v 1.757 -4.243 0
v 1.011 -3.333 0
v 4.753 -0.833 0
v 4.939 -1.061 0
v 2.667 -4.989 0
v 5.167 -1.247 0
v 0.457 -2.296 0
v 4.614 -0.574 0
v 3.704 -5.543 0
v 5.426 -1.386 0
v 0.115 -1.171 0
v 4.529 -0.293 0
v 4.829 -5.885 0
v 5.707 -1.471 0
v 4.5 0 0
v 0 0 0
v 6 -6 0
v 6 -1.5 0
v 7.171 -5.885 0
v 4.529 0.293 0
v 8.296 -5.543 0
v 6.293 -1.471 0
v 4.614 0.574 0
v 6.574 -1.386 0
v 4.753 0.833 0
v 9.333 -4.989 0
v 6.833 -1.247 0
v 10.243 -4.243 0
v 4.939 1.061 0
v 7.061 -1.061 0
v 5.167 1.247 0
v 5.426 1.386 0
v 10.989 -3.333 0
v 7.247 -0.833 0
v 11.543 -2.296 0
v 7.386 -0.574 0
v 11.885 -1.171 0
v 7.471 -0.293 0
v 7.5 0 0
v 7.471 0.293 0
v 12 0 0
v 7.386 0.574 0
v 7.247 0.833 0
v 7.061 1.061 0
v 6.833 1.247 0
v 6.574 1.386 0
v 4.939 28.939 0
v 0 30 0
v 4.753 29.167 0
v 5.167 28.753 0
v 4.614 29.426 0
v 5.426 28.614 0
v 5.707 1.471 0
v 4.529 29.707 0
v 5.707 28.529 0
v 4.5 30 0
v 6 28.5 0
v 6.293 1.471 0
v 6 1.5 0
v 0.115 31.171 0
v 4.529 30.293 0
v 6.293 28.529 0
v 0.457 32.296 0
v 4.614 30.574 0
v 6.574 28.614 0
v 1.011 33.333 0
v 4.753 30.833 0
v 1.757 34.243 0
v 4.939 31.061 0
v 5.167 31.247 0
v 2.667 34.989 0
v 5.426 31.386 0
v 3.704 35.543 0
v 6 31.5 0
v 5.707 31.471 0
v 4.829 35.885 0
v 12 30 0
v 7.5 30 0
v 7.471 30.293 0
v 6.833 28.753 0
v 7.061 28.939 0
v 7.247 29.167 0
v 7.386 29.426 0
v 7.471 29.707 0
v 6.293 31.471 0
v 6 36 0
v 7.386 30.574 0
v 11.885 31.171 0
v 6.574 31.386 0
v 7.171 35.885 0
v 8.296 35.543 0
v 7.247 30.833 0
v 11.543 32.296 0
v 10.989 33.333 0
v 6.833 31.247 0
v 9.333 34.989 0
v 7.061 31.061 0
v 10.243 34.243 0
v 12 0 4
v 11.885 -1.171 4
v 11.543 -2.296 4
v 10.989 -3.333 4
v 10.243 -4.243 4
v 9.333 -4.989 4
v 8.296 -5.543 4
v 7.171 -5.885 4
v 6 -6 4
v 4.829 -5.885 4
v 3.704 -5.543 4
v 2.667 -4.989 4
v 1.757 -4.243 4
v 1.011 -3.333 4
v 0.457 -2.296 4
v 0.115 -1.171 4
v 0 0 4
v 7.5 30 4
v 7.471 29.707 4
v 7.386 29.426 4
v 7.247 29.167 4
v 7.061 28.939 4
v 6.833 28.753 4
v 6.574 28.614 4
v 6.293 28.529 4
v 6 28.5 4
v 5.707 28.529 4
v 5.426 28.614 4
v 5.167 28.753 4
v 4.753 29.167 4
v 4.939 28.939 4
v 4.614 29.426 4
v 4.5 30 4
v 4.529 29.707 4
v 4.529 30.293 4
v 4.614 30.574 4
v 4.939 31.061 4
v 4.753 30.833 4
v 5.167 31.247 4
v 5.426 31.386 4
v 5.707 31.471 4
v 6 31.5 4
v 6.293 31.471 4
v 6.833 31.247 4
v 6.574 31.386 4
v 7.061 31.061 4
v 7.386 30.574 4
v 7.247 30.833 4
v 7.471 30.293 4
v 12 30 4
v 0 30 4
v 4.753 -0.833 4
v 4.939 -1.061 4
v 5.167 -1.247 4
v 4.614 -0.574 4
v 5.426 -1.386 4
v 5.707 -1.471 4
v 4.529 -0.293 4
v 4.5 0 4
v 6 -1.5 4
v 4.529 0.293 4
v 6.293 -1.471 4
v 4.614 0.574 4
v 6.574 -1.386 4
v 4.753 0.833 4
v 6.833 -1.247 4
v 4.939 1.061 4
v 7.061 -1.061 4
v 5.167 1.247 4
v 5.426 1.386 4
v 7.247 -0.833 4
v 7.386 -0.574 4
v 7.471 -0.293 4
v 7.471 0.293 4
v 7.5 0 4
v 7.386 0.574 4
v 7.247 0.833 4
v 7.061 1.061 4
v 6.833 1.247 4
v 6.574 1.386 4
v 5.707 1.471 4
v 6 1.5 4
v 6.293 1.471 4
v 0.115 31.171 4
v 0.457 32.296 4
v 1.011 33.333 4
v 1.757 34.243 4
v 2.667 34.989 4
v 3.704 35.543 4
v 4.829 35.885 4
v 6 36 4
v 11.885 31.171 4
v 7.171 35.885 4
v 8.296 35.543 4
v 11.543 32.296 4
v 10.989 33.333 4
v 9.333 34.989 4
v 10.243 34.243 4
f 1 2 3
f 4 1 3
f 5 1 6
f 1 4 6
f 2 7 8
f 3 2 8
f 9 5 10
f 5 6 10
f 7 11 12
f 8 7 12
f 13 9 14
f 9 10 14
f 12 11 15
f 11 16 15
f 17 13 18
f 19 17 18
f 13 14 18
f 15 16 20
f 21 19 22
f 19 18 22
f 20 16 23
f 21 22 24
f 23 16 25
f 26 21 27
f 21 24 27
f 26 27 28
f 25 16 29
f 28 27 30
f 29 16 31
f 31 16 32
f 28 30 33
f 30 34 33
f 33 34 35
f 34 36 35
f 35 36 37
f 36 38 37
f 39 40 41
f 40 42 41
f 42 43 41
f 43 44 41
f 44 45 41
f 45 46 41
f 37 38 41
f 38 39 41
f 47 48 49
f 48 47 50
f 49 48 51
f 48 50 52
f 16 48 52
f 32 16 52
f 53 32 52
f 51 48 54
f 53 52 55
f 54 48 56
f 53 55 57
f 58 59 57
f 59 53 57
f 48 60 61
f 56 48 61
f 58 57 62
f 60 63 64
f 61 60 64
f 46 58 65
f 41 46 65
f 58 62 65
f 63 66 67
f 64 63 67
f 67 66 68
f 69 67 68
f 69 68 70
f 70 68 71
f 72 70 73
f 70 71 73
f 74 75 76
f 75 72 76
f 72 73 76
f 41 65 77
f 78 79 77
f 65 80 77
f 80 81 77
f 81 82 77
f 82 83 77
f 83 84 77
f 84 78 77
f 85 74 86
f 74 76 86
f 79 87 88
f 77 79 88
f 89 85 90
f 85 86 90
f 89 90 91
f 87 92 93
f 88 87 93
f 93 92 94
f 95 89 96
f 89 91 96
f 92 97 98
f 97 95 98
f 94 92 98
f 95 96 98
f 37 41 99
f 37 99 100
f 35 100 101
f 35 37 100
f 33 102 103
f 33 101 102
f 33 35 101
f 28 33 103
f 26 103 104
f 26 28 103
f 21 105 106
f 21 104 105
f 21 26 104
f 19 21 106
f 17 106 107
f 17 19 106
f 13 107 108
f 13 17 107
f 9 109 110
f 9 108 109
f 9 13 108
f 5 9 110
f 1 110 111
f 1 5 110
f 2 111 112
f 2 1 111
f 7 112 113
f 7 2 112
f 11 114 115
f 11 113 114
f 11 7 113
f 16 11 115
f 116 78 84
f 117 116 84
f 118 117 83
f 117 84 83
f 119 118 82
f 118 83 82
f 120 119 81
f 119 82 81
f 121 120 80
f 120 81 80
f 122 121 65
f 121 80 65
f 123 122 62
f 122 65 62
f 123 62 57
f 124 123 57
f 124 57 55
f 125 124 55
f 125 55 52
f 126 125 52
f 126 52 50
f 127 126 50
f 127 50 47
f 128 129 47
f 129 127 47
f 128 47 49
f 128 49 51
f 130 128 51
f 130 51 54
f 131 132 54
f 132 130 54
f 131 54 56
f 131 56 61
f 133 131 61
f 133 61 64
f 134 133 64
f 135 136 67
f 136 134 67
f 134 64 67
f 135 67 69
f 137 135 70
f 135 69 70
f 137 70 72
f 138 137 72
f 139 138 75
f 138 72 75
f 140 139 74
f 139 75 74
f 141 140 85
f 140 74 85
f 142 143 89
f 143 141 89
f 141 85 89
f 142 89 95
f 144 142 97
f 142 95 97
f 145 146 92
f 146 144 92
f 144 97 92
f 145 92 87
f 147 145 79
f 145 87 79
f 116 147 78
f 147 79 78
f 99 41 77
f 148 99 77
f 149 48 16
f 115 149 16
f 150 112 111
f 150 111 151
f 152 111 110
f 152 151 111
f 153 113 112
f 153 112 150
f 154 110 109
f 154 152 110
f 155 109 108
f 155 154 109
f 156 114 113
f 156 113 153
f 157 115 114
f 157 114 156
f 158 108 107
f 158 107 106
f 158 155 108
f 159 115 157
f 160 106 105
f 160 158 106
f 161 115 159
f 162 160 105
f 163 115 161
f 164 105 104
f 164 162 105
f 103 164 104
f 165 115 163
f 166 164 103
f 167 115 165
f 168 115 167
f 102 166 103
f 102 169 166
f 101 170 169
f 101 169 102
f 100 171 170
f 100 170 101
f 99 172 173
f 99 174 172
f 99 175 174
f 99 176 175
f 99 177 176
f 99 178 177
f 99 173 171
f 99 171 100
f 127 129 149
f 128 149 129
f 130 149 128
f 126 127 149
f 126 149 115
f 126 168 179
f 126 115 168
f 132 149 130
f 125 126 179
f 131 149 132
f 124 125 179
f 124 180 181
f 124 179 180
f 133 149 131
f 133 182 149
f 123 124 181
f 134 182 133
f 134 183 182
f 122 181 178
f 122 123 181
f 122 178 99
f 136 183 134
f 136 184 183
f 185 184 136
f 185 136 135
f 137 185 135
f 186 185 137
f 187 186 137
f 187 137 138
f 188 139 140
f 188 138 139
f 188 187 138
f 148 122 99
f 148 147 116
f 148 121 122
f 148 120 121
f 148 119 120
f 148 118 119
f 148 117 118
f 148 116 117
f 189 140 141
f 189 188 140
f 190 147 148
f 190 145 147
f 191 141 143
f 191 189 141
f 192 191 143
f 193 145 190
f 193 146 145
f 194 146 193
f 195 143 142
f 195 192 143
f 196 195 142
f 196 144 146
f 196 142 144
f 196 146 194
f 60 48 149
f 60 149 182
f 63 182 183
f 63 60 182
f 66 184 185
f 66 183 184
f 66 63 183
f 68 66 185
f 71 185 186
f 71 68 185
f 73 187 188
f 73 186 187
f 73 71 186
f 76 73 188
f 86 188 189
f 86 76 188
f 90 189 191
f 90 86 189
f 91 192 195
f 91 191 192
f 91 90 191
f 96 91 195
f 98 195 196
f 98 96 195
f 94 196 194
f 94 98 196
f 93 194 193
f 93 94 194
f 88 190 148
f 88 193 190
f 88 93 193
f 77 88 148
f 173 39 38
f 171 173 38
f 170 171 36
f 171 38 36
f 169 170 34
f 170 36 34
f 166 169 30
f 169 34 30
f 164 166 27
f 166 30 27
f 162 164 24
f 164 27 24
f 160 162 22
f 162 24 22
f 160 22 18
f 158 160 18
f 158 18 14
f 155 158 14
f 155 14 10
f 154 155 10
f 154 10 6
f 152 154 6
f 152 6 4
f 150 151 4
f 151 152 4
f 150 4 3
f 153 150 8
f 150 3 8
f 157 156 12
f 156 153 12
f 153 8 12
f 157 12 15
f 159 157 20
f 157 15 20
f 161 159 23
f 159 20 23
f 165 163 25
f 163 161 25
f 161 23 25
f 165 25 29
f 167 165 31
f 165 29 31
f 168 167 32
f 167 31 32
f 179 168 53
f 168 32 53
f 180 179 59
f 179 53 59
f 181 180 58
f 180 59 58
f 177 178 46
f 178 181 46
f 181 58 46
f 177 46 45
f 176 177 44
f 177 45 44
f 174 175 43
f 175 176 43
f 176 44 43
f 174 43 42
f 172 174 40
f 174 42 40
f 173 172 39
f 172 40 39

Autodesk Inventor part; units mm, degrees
ref_plane "YZ Plane" through (0, 0, 0) normal (1, 0, 0) x (0, 1, 0)
ref_plane "XZ Plane" through (0, 0, 0) normal (0, 1, 0) x (-1, 0, 0)
ref_plane "XY Plane" through (0, 0, 0) normal (0, 0, 1) x (1, 0, 0)
sketch "Sketch1" plane through (0, 0, 0) normal (0, 0, 1) x (1, 0, 0)
  line L0 (0, 0) -> (12, 0) construction
  line L1 (12, 0) -> (12, 30)
  line L2 (12, 30) -> (0, 30) construction
  line L3 (0, 30) -> (0, 0)
  arc A0 (12, 30) -> (0, 30) centre (6, 30) ccw
  arc A1 (0, 0) -> (12, 0) centre (6, 0) ccw
  circle A2 centre (6, 30) radius 1.5
  circle A3 centre (6, 0) radius 1.5
  dimension "d0" = 12
  dimension "d1" = 30
  dimension "d2" = 3
  dimension "d3" = 3
extrude "Extrusion1" add sketch "Sketch1" along normal blind 4
properties part number "z axis arm1"
